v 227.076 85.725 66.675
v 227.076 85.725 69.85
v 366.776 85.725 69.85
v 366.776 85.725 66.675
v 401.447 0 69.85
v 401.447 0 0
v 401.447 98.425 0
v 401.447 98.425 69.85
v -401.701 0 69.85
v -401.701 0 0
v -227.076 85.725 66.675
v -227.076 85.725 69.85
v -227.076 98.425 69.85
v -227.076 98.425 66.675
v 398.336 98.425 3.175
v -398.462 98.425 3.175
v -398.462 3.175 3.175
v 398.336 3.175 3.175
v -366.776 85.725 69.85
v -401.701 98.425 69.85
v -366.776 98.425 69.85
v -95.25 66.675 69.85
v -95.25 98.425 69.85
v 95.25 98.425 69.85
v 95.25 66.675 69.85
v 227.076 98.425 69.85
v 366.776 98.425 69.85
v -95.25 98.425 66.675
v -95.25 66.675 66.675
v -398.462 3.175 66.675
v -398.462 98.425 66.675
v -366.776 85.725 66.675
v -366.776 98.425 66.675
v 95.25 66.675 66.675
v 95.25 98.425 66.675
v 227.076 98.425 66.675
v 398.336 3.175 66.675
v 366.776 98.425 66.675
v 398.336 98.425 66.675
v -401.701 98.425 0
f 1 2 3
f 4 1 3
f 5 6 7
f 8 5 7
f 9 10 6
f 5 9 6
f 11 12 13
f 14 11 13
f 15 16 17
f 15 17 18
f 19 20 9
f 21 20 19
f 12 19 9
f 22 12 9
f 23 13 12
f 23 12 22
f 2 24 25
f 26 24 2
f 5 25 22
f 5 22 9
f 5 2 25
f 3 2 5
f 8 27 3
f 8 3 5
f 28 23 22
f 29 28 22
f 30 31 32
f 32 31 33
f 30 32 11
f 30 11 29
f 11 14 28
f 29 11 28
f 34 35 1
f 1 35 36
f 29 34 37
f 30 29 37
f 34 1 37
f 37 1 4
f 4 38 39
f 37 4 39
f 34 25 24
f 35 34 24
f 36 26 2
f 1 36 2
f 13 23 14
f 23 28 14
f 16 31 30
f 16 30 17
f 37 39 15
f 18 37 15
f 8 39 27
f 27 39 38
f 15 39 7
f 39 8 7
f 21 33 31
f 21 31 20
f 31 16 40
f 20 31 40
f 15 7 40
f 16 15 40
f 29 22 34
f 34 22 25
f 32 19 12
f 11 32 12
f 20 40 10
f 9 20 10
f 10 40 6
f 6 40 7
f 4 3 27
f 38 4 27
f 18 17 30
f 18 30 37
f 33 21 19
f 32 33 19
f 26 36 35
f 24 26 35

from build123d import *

# Parameters (mm, degrees)
BOSS_EXTRUDE1_DEPTH = 69.85
SKETCH3_W           = 796.798
SKETCH3_H           = 63.5
CUT_EXTRUDE1_DEPTH  = 95.25
CUT_EXTRUDE3_DEPTH  = 3.175


with BuildPart() as part:
    # Sketch2 → Boss-Extrude1 (new body)
    with BuildSketch(Plane.XY):
        Polygon((90.424, 0), (357.124, 0), (401.447, 0), (401.447, 98.425), (-401.701, 98.425), (-401.701, 0), (-366.776, 0), (-227.076, 0), (-100.076, 0), align=None)
    extrude(amount=BOSS_EXTRUDE1_DEPTH)

    # Sketch3 → Cut-Extrude1 (cut)
    with BuildSketch(Plane(origin=(0, 98.425, 0), x_dir=(1, 0, 0), z_dir=(0, 1, 0))):
        with Locations((-0.0635, -34.925)):
            Rectangle(SKETCH3_W, SKETCH3_H)
    extrude(amount=-CUT_EXTRUDE1_DEPTH, mode=Mode.SUBTRACT)

    # Sketch4 → Cut-Extrude3 (cut)
    with BuildSketch(Plane.XY.offset(69.85)):
        Polygon((-366.776, 98.425), (-366.776, 85.725), (-227.076, 85.725), (-227.076, 189.981198682), (-227.076, 207.999074197), (-95.25, 207.999074197), (-95.25, 98.425), (-95.25, 66.675), (95.25, 66.675), (95.25, 98.425), (95.25, 207.999074197), (227.076, 207.999074197), (227.076, 98.425), (227.076, 85.725), (366.776, 85.725), (366.776, 98.425), (366.776, 207.999074197), (366.776, 225.818081793), (-366.776, 225.818081793), (-366.776, 207.999074197), align=None)
    extrude(amount=-CUT_EXTRUDE3_DEPTH, mode=Mode.SUBTRACT)


solid = part.part
